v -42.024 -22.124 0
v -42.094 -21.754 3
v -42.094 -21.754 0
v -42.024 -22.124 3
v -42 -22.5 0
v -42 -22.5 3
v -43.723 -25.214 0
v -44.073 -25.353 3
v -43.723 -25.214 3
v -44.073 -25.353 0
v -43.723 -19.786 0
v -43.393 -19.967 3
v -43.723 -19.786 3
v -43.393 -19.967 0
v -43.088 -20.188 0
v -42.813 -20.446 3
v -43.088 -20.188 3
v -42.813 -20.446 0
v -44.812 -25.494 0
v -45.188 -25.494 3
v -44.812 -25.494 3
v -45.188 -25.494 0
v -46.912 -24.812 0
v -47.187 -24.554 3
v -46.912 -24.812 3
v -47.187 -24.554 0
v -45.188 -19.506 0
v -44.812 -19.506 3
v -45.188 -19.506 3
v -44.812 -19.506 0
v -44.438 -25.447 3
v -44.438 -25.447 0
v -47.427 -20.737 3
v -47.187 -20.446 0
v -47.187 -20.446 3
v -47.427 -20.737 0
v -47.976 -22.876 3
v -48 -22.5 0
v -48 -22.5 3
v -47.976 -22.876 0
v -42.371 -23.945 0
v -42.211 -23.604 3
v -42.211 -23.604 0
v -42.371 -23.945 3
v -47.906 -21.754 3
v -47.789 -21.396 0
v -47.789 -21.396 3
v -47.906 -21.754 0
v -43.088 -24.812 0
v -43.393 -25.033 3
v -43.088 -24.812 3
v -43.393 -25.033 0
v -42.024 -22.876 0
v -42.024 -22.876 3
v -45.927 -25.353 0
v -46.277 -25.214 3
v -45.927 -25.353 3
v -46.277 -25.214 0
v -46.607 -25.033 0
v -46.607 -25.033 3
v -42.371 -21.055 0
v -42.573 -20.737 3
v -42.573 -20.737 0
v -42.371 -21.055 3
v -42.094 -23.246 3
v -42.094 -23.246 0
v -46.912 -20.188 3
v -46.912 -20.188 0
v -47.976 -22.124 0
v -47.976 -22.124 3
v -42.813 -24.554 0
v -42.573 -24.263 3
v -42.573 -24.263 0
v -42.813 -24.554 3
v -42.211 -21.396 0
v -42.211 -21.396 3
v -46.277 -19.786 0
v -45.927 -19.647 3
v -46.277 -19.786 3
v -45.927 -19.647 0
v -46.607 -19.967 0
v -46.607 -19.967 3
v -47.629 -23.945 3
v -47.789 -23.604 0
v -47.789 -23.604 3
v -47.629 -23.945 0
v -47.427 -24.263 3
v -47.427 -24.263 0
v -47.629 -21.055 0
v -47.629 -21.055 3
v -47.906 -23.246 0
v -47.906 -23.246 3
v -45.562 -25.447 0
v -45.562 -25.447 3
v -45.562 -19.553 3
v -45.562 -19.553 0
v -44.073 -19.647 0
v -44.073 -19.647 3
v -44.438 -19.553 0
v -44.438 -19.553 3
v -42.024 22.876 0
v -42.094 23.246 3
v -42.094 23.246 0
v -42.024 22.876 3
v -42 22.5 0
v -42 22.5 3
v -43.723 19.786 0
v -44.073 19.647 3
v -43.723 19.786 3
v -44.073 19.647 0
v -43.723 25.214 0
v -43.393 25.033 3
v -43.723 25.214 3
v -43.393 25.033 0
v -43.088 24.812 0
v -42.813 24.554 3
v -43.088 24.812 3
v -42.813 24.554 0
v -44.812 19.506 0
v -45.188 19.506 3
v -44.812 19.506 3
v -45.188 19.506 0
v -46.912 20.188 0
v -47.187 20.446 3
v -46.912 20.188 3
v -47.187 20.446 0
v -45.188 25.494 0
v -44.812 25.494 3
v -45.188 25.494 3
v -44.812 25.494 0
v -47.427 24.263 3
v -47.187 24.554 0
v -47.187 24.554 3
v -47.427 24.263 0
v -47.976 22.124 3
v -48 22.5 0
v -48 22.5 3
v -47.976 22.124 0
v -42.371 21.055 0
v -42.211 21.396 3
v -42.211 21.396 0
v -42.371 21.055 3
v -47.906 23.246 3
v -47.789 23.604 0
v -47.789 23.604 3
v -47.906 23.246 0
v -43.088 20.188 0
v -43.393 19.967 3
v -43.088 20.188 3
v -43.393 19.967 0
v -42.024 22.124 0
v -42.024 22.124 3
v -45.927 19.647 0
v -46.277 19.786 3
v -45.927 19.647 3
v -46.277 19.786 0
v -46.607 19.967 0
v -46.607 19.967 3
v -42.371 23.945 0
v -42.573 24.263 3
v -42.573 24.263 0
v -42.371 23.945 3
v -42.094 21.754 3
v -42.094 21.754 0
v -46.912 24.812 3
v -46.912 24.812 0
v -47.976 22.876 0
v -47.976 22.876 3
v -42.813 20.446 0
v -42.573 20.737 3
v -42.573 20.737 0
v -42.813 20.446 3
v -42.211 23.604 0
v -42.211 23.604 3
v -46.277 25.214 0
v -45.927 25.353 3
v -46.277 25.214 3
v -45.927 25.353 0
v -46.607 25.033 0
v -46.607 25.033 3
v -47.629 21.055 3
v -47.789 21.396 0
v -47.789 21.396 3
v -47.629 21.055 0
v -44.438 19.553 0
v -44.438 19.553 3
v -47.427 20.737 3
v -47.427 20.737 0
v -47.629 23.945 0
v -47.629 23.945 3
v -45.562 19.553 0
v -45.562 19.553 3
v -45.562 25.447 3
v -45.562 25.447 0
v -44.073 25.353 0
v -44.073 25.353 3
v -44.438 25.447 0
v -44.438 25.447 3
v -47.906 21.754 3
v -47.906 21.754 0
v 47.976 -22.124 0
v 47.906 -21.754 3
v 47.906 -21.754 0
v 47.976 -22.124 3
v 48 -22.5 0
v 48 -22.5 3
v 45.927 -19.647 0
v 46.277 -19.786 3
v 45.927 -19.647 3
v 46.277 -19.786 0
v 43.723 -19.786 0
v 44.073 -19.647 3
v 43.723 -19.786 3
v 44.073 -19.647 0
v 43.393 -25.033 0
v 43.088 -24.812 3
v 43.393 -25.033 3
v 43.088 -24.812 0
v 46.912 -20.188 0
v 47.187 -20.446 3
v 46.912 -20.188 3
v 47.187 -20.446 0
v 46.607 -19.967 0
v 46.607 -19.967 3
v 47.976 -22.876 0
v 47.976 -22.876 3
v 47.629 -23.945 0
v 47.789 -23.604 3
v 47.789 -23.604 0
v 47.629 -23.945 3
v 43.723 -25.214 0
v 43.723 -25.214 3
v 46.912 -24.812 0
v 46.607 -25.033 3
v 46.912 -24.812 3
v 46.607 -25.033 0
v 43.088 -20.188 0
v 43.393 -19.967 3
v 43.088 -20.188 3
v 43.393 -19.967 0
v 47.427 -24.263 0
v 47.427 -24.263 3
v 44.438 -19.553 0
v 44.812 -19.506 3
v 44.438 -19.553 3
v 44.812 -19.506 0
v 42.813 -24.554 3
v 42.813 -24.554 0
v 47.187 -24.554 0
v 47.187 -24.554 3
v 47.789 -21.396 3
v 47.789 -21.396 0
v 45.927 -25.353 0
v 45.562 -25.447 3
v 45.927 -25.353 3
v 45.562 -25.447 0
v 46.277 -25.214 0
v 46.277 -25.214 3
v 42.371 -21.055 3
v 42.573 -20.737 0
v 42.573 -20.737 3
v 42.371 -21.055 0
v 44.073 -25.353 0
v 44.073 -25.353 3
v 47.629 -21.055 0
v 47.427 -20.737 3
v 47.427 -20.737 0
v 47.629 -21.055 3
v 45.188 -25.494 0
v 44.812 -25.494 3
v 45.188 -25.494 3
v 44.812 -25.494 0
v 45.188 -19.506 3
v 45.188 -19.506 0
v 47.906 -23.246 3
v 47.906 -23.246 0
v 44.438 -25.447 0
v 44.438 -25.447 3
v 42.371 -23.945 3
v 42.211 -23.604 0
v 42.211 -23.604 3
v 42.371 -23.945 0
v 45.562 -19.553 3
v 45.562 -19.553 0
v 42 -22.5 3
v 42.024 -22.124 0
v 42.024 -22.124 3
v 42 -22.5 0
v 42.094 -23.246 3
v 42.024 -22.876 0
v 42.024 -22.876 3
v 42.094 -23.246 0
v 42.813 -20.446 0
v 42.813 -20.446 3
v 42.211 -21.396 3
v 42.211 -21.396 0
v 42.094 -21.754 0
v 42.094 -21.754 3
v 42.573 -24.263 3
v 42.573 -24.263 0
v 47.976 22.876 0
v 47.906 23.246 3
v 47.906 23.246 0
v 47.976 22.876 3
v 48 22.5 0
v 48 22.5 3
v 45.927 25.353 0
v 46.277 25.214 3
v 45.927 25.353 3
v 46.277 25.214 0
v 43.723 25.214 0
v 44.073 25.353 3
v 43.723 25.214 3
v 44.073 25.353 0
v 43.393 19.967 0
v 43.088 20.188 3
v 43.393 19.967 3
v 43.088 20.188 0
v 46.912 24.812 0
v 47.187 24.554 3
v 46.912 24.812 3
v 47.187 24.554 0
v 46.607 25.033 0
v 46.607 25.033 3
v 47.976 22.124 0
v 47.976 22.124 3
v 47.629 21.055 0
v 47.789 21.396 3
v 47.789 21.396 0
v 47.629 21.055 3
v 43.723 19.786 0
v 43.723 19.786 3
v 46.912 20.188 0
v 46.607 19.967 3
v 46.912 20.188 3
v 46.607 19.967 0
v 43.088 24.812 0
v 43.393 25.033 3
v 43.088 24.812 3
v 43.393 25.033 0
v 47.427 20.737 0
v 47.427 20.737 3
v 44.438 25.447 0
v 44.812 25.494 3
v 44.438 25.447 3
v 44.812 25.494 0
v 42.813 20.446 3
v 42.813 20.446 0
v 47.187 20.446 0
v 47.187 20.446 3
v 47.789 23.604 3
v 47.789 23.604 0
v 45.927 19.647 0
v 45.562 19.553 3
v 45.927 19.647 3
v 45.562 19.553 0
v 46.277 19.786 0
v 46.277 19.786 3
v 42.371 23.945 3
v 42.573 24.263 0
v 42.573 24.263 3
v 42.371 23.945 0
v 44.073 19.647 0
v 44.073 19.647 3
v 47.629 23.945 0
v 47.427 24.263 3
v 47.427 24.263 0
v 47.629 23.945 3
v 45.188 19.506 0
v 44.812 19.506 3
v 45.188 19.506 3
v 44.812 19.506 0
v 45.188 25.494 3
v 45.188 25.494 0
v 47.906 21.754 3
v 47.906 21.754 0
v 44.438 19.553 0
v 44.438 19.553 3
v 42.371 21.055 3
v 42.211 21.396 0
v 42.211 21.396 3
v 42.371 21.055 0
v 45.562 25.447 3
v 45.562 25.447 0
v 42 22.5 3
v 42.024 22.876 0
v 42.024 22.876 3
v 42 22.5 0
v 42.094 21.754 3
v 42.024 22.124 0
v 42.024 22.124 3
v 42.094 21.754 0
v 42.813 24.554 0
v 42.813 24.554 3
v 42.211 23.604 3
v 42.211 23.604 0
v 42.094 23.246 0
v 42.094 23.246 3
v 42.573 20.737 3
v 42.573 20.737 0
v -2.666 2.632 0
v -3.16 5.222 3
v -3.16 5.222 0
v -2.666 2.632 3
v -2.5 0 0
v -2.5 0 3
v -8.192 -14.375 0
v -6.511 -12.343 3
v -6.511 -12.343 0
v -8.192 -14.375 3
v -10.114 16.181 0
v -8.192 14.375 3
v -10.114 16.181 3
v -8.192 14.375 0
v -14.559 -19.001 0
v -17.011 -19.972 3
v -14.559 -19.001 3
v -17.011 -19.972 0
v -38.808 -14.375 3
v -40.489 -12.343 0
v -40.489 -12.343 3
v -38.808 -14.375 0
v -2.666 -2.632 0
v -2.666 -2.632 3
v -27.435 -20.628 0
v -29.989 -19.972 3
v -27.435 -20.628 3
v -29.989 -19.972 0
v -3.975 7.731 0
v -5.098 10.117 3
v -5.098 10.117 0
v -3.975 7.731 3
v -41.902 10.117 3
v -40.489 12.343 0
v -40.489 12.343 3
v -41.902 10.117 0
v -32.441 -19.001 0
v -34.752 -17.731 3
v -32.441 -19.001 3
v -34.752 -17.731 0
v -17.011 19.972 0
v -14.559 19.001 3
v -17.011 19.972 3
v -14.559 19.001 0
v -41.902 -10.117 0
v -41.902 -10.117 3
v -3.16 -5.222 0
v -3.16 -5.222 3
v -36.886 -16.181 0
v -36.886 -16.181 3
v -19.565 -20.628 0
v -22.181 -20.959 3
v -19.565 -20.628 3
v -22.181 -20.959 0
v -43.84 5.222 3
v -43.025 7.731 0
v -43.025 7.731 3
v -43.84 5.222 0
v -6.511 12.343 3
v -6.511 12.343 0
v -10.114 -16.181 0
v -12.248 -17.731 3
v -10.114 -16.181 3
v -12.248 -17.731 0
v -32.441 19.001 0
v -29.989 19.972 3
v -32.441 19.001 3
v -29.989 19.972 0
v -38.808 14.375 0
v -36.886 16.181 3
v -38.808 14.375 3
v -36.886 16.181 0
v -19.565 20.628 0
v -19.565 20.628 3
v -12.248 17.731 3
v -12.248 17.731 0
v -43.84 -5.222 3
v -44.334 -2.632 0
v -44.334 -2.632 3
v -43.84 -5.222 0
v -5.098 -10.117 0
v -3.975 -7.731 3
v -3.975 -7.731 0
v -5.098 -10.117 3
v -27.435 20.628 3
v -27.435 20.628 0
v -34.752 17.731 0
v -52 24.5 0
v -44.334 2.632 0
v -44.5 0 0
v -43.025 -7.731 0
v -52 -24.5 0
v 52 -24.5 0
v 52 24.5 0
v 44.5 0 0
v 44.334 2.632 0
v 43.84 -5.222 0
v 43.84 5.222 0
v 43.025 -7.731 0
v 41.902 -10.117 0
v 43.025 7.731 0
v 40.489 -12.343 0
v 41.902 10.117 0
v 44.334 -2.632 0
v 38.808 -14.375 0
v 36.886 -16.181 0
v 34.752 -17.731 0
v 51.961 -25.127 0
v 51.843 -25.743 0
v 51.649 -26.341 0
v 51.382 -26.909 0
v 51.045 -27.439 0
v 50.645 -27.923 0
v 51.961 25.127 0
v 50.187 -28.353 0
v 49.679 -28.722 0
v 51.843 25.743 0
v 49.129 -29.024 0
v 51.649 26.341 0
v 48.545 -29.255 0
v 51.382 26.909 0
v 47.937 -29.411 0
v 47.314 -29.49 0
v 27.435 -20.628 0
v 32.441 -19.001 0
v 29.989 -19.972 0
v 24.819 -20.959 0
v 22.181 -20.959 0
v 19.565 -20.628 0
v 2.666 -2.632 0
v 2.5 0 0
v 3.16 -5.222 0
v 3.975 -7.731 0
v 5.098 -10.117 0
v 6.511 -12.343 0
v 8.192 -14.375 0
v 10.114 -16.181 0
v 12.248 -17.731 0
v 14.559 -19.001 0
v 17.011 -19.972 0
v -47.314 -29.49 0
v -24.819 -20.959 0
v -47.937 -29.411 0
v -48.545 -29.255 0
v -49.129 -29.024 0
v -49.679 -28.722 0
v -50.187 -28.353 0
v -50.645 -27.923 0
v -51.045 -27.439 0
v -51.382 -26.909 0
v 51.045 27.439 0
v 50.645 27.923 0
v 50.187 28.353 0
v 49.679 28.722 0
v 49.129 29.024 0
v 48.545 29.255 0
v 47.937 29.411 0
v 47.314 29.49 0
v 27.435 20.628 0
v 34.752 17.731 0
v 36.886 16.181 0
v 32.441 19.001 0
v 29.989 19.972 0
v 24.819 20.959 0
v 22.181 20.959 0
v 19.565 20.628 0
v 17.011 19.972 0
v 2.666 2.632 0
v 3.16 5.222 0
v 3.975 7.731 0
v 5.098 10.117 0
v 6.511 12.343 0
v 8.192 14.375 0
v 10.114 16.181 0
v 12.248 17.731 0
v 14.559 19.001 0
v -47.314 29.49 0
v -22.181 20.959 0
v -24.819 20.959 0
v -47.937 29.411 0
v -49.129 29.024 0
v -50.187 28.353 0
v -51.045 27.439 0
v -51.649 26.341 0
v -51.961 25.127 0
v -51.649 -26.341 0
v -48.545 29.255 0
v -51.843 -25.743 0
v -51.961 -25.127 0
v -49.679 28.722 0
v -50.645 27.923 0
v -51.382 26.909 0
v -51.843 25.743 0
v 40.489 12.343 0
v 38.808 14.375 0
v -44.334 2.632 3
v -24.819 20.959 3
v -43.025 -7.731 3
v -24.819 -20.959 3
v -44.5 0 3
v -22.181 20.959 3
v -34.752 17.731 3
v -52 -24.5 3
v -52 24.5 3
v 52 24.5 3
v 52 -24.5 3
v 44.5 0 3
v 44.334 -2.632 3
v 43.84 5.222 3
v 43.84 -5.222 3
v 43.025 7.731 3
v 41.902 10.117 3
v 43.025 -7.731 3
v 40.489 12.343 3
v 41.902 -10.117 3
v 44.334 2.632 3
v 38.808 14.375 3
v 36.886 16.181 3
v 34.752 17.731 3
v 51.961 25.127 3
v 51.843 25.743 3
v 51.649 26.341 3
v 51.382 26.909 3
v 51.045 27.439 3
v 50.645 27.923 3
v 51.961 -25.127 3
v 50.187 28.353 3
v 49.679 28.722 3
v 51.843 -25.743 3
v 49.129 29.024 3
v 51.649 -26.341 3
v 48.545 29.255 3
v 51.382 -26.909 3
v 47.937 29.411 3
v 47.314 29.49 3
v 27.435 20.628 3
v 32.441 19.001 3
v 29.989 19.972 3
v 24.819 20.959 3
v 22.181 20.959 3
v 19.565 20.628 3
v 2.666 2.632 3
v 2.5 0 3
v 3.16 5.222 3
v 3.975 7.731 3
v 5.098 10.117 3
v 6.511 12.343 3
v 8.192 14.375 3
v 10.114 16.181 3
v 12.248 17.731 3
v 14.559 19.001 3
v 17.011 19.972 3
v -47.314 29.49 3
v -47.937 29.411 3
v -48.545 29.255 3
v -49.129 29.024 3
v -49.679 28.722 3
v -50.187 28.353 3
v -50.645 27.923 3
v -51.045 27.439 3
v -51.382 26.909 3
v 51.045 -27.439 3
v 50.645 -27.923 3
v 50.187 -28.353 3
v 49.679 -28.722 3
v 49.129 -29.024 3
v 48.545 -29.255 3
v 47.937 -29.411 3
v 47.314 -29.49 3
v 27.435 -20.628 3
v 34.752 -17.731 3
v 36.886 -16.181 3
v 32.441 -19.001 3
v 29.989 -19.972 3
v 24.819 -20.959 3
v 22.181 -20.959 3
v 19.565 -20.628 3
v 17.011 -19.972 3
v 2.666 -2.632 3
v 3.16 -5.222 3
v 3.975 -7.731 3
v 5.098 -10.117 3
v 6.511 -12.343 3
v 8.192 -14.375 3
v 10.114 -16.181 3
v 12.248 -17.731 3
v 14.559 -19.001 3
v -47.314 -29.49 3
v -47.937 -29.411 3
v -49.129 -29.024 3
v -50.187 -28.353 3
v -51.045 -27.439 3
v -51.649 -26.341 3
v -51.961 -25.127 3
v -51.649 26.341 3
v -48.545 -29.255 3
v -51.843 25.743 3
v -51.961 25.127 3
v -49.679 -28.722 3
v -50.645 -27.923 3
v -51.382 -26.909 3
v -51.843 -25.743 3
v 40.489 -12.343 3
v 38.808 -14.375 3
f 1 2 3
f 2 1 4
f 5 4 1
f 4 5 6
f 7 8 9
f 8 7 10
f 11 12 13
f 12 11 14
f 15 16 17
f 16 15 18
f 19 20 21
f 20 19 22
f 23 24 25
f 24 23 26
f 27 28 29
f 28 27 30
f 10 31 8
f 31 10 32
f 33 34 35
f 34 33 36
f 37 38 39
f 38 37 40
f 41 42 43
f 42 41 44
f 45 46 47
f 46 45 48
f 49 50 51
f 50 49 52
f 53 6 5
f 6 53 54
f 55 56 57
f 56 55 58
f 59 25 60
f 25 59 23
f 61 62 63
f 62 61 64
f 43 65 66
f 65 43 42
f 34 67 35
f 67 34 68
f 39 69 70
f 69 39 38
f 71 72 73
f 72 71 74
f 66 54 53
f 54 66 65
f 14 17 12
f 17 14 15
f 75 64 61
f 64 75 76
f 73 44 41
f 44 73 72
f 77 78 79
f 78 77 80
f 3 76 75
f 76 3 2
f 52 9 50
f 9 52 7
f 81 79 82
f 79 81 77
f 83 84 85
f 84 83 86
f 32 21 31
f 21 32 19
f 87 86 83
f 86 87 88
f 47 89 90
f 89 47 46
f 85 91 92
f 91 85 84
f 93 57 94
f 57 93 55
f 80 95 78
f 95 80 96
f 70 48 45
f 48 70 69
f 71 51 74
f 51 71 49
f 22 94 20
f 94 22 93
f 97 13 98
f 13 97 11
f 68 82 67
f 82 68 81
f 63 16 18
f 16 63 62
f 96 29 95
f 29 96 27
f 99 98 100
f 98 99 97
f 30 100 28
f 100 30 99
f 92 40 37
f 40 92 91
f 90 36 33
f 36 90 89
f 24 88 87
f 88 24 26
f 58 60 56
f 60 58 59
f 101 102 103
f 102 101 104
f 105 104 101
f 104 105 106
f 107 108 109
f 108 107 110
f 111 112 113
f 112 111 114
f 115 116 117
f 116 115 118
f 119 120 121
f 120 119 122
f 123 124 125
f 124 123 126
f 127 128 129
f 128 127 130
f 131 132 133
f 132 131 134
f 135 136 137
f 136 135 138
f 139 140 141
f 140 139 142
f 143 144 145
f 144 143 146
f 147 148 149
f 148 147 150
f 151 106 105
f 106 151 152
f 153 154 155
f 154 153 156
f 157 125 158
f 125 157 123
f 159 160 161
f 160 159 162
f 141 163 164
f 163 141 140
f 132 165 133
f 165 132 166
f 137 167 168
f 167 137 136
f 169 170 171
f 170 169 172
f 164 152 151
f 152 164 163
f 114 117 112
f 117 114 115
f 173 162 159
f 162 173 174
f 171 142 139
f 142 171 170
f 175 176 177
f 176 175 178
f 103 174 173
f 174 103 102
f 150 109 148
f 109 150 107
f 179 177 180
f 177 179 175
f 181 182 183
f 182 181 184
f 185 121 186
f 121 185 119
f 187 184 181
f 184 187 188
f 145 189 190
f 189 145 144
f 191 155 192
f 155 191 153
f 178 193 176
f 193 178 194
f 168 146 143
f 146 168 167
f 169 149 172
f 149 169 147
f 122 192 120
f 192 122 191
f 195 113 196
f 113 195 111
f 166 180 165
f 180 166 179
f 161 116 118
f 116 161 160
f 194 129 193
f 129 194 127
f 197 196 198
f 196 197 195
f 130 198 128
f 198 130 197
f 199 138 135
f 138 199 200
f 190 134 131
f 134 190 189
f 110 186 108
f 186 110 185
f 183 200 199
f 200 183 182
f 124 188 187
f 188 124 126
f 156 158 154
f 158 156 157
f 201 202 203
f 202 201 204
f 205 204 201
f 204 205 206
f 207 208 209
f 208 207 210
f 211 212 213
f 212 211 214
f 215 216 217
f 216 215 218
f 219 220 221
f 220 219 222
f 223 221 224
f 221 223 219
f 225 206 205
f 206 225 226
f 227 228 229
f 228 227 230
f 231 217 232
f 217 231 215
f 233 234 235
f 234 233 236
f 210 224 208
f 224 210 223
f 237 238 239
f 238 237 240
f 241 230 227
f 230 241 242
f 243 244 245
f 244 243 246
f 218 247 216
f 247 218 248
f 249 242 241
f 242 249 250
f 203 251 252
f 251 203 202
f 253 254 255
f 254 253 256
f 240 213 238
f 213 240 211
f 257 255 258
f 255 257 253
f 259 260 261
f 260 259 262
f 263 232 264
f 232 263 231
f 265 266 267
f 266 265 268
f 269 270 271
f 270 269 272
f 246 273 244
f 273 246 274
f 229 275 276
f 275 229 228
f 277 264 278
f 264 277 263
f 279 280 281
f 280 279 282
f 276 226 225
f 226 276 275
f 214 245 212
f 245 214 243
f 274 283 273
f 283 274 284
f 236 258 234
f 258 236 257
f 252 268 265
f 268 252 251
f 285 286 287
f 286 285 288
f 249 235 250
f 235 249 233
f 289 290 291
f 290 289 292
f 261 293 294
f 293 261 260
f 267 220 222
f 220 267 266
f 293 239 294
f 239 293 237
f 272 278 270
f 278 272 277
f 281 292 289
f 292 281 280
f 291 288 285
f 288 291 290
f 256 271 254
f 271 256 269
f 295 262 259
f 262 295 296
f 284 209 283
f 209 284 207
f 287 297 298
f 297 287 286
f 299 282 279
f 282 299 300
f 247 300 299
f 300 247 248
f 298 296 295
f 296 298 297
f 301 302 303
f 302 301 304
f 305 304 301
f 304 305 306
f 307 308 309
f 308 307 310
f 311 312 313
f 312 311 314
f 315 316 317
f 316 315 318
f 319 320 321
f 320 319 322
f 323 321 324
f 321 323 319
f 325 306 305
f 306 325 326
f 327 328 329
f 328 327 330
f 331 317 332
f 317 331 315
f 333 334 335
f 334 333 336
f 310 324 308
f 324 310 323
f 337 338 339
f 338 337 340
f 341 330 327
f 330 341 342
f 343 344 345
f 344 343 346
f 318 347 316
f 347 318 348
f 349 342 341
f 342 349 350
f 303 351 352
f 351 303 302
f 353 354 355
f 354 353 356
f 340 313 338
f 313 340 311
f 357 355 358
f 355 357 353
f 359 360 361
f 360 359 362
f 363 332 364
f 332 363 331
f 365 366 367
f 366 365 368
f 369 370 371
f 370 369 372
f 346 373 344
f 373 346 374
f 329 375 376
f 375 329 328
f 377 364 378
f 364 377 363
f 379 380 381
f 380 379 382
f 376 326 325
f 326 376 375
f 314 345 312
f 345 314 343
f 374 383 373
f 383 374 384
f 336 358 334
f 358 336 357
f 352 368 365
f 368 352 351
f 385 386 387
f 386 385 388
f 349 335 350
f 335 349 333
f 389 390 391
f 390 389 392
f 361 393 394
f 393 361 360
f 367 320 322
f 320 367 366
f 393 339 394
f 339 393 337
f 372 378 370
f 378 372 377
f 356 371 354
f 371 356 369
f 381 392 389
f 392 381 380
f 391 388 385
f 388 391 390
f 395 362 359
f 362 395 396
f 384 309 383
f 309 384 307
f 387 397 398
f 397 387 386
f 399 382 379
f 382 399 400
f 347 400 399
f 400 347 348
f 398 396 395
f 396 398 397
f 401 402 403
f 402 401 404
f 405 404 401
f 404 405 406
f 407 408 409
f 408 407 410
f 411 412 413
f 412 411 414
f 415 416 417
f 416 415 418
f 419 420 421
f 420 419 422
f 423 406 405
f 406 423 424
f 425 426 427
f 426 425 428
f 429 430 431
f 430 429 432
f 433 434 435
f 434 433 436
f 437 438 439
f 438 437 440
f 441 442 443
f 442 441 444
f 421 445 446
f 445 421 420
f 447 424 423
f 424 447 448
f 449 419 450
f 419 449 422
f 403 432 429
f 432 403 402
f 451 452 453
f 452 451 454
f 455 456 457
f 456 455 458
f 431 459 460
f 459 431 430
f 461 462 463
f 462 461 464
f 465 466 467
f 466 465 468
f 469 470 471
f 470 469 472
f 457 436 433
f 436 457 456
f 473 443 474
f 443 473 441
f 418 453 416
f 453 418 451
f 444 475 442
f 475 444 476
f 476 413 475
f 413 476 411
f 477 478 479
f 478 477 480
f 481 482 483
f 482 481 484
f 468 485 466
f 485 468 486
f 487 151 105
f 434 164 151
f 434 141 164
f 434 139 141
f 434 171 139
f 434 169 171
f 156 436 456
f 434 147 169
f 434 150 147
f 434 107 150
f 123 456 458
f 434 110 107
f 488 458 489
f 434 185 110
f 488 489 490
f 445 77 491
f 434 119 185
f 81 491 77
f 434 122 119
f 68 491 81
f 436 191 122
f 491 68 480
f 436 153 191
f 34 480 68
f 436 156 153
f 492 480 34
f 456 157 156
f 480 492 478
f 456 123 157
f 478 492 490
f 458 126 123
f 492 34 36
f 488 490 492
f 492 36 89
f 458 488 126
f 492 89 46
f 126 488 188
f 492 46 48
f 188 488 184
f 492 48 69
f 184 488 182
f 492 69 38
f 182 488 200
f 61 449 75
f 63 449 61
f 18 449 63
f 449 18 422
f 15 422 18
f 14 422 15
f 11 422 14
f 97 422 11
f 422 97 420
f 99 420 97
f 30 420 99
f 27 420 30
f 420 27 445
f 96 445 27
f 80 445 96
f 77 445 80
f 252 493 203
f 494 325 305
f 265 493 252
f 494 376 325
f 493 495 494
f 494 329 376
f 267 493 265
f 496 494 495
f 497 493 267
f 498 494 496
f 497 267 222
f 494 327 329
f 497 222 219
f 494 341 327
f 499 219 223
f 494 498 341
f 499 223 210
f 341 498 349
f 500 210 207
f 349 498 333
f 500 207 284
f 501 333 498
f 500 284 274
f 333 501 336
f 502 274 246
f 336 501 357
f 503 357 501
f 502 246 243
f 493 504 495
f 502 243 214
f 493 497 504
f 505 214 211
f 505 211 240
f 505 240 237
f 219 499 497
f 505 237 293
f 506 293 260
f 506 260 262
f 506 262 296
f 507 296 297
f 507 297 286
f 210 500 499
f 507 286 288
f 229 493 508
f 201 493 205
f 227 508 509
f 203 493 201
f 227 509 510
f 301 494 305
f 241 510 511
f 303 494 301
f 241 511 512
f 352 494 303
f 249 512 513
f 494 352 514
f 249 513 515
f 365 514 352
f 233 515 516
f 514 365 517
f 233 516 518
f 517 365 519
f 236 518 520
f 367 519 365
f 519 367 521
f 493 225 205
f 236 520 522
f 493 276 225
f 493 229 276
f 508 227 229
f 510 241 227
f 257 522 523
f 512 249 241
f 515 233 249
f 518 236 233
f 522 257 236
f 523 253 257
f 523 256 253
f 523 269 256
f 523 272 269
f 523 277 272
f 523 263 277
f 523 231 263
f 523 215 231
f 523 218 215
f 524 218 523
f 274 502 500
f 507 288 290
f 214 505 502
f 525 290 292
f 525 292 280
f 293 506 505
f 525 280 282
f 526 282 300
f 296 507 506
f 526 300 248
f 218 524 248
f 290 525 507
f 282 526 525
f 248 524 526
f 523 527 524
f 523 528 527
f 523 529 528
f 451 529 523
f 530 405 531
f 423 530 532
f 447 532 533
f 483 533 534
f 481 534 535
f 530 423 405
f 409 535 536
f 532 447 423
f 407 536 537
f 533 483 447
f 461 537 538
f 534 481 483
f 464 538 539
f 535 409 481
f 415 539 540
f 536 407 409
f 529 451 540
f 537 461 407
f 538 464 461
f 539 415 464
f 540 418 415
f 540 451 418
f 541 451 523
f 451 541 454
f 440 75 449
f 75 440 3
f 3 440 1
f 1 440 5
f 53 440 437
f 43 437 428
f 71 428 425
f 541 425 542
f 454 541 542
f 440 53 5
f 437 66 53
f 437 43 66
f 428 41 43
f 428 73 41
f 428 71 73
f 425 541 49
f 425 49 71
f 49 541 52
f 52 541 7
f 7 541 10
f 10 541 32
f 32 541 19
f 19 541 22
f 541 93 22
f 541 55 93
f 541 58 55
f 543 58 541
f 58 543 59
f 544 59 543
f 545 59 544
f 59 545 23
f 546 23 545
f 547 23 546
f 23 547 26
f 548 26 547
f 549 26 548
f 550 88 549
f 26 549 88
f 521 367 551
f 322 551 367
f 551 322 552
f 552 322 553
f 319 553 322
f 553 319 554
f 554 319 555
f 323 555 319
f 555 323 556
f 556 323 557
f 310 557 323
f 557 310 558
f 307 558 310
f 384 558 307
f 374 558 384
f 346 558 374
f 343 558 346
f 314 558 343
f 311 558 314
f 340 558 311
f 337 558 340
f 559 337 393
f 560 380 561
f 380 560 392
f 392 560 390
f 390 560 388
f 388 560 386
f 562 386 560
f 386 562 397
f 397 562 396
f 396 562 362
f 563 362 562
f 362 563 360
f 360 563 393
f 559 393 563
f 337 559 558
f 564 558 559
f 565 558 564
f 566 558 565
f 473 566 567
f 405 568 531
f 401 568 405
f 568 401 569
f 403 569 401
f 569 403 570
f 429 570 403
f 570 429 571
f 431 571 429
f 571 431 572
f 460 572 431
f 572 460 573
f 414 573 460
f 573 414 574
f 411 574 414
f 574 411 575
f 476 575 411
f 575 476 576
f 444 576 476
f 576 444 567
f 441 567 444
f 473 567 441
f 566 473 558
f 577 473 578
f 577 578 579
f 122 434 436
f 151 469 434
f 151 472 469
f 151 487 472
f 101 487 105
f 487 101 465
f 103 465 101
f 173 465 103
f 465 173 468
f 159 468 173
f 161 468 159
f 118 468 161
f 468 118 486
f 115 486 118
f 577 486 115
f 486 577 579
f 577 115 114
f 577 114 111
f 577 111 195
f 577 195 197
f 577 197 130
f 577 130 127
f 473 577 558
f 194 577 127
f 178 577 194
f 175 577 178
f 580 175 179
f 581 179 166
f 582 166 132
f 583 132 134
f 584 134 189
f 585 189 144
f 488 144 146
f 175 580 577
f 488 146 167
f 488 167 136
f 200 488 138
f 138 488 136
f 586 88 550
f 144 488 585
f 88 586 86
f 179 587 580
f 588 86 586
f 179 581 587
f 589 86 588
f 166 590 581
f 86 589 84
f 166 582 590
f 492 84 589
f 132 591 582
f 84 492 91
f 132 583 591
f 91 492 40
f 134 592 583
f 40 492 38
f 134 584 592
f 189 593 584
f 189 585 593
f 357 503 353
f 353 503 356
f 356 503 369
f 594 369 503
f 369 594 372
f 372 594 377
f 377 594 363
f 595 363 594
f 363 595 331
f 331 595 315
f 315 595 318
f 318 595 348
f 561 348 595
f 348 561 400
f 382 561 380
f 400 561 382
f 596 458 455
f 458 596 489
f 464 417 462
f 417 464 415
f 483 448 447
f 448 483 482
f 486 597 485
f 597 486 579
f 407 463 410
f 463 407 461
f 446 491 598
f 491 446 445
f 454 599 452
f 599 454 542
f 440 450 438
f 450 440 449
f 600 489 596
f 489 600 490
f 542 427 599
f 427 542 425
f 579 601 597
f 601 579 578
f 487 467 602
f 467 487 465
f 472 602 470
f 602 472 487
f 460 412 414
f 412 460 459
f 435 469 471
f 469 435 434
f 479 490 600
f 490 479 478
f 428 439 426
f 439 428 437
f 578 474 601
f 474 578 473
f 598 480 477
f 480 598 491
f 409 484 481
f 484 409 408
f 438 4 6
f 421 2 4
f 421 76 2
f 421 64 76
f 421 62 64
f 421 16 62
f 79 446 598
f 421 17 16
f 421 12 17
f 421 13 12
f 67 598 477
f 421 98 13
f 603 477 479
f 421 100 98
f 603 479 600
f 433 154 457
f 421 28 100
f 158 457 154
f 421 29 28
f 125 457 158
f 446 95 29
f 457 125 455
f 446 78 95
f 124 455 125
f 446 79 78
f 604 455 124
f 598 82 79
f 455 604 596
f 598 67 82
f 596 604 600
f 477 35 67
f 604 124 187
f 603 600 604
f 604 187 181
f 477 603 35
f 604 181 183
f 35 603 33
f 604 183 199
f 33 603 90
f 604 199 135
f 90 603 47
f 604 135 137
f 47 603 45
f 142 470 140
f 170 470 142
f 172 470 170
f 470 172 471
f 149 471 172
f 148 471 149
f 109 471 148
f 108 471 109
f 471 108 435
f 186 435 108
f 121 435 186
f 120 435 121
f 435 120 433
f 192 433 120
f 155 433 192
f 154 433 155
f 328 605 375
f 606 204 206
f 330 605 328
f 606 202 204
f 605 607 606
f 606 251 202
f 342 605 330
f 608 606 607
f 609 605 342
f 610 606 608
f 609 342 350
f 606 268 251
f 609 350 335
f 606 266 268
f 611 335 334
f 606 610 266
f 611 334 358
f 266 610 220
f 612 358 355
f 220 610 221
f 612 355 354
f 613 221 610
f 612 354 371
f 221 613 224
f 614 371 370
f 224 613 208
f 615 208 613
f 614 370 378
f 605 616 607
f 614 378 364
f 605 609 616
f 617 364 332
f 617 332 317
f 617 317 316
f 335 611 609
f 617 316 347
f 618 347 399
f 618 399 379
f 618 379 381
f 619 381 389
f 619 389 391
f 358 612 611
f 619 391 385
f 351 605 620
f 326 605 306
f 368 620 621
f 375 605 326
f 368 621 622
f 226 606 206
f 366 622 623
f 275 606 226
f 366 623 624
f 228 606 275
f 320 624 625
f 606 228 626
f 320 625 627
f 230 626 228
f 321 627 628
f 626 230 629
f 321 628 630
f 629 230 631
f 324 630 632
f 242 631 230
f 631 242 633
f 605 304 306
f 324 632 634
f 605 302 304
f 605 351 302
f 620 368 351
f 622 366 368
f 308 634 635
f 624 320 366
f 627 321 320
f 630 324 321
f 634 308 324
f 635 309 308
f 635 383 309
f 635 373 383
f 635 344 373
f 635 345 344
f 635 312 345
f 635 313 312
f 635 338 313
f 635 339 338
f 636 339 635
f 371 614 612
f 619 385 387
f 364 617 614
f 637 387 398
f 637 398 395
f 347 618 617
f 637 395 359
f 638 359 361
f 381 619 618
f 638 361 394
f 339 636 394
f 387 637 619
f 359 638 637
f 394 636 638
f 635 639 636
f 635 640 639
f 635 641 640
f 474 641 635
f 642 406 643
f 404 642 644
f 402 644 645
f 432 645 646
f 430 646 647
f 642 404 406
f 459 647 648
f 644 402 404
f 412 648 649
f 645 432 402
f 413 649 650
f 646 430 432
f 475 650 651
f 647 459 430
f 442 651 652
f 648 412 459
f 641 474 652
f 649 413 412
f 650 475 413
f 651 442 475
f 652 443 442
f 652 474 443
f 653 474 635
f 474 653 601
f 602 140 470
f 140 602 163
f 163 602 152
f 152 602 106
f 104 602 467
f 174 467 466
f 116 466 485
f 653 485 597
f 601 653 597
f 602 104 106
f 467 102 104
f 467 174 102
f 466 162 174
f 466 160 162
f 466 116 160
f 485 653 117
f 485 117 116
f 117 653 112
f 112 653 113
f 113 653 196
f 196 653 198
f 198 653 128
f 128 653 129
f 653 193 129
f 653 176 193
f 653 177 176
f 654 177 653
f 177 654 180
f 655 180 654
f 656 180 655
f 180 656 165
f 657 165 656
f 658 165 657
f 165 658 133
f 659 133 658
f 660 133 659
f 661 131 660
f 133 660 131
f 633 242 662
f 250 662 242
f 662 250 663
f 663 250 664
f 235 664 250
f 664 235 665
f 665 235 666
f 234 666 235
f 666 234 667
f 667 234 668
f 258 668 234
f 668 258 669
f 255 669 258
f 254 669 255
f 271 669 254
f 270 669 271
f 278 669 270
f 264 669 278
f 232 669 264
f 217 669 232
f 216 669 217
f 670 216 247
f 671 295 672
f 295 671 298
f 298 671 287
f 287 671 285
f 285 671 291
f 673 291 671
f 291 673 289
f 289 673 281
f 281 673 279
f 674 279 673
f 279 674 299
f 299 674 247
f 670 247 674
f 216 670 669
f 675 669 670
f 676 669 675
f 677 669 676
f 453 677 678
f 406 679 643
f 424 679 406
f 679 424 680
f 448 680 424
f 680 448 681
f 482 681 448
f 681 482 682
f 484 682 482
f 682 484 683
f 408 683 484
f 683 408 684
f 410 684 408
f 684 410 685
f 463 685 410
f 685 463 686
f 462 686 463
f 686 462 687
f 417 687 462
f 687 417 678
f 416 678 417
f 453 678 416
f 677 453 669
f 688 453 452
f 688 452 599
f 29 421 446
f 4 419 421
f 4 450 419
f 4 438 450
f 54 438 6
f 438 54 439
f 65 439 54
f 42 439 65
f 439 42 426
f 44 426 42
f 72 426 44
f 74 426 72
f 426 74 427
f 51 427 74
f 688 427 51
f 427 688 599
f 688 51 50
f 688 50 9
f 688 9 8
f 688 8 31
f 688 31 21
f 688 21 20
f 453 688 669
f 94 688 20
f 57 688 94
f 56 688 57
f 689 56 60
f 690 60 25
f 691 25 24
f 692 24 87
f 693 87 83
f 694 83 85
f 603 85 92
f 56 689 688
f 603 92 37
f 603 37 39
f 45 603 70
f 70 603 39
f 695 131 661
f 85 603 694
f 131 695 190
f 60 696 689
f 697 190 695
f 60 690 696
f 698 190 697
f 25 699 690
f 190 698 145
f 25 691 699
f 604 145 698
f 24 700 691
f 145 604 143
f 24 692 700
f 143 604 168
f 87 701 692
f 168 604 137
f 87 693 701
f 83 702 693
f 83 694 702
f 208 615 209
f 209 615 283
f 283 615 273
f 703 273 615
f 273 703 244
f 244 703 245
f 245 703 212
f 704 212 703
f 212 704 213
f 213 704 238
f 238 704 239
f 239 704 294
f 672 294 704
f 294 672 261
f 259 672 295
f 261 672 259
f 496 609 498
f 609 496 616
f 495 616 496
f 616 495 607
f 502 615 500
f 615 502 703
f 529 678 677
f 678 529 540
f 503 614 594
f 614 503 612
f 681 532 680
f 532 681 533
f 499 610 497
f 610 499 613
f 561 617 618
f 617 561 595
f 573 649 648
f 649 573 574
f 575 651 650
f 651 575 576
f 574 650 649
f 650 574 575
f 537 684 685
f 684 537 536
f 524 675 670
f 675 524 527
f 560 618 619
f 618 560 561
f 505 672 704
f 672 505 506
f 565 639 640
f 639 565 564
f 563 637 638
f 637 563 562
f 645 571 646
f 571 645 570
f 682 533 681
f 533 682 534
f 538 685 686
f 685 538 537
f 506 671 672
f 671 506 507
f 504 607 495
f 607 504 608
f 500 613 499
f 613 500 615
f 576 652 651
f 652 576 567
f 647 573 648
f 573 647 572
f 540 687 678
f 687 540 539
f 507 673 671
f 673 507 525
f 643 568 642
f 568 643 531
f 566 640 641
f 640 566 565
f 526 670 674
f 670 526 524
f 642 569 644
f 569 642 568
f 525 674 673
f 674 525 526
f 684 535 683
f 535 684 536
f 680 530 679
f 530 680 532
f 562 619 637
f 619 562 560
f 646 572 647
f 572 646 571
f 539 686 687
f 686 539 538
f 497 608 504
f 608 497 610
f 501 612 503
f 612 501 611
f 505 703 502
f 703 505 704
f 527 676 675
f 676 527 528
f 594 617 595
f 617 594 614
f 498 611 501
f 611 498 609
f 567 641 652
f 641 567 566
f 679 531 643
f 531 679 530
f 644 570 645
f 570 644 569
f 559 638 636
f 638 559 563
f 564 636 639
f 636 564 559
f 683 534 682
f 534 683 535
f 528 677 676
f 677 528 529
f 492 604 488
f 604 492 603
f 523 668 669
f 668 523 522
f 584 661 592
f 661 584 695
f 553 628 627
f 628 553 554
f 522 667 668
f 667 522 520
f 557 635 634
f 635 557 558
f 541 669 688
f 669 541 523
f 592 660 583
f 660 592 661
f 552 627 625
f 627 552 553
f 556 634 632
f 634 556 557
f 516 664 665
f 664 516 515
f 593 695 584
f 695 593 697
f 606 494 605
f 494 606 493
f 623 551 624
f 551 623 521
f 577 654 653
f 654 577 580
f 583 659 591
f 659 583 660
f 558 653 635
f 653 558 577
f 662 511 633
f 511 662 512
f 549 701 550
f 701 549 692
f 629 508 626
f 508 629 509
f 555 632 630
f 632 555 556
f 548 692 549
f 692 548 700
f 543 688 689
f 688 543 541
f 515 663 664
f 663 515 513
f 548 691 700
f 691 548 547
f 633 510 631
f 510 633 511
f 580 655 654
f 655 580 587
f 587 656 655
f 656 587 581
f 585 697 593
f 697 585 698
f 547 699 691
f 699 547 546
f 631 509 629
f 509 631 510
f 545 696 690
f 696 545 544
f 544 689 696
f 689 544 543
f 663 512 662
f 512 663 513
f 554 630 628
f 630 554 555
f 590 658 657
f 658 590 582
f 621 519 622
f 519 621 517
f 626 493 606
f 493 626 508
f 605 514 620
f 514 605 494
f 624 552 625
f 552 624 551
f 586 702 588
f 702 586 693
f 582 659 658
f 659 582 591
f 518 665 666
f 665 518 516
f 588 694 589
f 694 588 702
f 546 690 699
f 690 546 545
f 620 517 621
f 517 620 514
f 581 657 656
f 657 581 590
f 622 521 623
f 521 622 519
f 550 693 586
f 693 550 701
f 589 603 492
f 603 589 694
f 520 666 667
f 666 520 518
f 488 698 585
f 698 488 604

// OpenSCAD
$fn = 50;


difference() {
	union() {
		hull() {
			translate(v = [-47.0000000000, 24.5000000000, 0]) {
				cylinder(h = 3, r = 5);
			}
			translate(v = [47.0000000000, 24.5000000000, 0]) {
				cylinder(h = 3, r = 5);
			}
			translate(v = [-47.0000000000, -24.5000000000, 0]) {
				cylinder(h = 3, r = 5);
			}
			translate(v = [47.0000000000, -24.5000000000, 0]) {
				cylinder(h = 3, r = 5);
			}
		}
	}
	union() {
		#translate(v = [-45.0000000000, -22.5000000000, -100.0000000000]) {
			cylinder(h = 200, r = 3.0000000000);
		}
		#translate(v = [-45.0000000000, 22.5000000000, -100.0000000000]) {
			cylinder(h = 200, r = 3.0000000000);
		}
		#translate(v = [45.0000000000, -22.5000000000, -100.0000000000]) {
			cylinder(h = 200, r = 3.0000000000);
		}
		#translate(v = [45.0000000000, 22.5000000000, -100.0000000000]) {
			cylinder(h = 200, r = 3.0000000000);
		}
		#translate(v = [-23.5000000000, 0, 0]) {
			cylinder(h = 3, r = 21.0000000000);
		}
		#translate(v = [23.5000000000, 0, 0]) {
			cylinder(h = 3, r = 21.0000000000);
		}
	}
}
